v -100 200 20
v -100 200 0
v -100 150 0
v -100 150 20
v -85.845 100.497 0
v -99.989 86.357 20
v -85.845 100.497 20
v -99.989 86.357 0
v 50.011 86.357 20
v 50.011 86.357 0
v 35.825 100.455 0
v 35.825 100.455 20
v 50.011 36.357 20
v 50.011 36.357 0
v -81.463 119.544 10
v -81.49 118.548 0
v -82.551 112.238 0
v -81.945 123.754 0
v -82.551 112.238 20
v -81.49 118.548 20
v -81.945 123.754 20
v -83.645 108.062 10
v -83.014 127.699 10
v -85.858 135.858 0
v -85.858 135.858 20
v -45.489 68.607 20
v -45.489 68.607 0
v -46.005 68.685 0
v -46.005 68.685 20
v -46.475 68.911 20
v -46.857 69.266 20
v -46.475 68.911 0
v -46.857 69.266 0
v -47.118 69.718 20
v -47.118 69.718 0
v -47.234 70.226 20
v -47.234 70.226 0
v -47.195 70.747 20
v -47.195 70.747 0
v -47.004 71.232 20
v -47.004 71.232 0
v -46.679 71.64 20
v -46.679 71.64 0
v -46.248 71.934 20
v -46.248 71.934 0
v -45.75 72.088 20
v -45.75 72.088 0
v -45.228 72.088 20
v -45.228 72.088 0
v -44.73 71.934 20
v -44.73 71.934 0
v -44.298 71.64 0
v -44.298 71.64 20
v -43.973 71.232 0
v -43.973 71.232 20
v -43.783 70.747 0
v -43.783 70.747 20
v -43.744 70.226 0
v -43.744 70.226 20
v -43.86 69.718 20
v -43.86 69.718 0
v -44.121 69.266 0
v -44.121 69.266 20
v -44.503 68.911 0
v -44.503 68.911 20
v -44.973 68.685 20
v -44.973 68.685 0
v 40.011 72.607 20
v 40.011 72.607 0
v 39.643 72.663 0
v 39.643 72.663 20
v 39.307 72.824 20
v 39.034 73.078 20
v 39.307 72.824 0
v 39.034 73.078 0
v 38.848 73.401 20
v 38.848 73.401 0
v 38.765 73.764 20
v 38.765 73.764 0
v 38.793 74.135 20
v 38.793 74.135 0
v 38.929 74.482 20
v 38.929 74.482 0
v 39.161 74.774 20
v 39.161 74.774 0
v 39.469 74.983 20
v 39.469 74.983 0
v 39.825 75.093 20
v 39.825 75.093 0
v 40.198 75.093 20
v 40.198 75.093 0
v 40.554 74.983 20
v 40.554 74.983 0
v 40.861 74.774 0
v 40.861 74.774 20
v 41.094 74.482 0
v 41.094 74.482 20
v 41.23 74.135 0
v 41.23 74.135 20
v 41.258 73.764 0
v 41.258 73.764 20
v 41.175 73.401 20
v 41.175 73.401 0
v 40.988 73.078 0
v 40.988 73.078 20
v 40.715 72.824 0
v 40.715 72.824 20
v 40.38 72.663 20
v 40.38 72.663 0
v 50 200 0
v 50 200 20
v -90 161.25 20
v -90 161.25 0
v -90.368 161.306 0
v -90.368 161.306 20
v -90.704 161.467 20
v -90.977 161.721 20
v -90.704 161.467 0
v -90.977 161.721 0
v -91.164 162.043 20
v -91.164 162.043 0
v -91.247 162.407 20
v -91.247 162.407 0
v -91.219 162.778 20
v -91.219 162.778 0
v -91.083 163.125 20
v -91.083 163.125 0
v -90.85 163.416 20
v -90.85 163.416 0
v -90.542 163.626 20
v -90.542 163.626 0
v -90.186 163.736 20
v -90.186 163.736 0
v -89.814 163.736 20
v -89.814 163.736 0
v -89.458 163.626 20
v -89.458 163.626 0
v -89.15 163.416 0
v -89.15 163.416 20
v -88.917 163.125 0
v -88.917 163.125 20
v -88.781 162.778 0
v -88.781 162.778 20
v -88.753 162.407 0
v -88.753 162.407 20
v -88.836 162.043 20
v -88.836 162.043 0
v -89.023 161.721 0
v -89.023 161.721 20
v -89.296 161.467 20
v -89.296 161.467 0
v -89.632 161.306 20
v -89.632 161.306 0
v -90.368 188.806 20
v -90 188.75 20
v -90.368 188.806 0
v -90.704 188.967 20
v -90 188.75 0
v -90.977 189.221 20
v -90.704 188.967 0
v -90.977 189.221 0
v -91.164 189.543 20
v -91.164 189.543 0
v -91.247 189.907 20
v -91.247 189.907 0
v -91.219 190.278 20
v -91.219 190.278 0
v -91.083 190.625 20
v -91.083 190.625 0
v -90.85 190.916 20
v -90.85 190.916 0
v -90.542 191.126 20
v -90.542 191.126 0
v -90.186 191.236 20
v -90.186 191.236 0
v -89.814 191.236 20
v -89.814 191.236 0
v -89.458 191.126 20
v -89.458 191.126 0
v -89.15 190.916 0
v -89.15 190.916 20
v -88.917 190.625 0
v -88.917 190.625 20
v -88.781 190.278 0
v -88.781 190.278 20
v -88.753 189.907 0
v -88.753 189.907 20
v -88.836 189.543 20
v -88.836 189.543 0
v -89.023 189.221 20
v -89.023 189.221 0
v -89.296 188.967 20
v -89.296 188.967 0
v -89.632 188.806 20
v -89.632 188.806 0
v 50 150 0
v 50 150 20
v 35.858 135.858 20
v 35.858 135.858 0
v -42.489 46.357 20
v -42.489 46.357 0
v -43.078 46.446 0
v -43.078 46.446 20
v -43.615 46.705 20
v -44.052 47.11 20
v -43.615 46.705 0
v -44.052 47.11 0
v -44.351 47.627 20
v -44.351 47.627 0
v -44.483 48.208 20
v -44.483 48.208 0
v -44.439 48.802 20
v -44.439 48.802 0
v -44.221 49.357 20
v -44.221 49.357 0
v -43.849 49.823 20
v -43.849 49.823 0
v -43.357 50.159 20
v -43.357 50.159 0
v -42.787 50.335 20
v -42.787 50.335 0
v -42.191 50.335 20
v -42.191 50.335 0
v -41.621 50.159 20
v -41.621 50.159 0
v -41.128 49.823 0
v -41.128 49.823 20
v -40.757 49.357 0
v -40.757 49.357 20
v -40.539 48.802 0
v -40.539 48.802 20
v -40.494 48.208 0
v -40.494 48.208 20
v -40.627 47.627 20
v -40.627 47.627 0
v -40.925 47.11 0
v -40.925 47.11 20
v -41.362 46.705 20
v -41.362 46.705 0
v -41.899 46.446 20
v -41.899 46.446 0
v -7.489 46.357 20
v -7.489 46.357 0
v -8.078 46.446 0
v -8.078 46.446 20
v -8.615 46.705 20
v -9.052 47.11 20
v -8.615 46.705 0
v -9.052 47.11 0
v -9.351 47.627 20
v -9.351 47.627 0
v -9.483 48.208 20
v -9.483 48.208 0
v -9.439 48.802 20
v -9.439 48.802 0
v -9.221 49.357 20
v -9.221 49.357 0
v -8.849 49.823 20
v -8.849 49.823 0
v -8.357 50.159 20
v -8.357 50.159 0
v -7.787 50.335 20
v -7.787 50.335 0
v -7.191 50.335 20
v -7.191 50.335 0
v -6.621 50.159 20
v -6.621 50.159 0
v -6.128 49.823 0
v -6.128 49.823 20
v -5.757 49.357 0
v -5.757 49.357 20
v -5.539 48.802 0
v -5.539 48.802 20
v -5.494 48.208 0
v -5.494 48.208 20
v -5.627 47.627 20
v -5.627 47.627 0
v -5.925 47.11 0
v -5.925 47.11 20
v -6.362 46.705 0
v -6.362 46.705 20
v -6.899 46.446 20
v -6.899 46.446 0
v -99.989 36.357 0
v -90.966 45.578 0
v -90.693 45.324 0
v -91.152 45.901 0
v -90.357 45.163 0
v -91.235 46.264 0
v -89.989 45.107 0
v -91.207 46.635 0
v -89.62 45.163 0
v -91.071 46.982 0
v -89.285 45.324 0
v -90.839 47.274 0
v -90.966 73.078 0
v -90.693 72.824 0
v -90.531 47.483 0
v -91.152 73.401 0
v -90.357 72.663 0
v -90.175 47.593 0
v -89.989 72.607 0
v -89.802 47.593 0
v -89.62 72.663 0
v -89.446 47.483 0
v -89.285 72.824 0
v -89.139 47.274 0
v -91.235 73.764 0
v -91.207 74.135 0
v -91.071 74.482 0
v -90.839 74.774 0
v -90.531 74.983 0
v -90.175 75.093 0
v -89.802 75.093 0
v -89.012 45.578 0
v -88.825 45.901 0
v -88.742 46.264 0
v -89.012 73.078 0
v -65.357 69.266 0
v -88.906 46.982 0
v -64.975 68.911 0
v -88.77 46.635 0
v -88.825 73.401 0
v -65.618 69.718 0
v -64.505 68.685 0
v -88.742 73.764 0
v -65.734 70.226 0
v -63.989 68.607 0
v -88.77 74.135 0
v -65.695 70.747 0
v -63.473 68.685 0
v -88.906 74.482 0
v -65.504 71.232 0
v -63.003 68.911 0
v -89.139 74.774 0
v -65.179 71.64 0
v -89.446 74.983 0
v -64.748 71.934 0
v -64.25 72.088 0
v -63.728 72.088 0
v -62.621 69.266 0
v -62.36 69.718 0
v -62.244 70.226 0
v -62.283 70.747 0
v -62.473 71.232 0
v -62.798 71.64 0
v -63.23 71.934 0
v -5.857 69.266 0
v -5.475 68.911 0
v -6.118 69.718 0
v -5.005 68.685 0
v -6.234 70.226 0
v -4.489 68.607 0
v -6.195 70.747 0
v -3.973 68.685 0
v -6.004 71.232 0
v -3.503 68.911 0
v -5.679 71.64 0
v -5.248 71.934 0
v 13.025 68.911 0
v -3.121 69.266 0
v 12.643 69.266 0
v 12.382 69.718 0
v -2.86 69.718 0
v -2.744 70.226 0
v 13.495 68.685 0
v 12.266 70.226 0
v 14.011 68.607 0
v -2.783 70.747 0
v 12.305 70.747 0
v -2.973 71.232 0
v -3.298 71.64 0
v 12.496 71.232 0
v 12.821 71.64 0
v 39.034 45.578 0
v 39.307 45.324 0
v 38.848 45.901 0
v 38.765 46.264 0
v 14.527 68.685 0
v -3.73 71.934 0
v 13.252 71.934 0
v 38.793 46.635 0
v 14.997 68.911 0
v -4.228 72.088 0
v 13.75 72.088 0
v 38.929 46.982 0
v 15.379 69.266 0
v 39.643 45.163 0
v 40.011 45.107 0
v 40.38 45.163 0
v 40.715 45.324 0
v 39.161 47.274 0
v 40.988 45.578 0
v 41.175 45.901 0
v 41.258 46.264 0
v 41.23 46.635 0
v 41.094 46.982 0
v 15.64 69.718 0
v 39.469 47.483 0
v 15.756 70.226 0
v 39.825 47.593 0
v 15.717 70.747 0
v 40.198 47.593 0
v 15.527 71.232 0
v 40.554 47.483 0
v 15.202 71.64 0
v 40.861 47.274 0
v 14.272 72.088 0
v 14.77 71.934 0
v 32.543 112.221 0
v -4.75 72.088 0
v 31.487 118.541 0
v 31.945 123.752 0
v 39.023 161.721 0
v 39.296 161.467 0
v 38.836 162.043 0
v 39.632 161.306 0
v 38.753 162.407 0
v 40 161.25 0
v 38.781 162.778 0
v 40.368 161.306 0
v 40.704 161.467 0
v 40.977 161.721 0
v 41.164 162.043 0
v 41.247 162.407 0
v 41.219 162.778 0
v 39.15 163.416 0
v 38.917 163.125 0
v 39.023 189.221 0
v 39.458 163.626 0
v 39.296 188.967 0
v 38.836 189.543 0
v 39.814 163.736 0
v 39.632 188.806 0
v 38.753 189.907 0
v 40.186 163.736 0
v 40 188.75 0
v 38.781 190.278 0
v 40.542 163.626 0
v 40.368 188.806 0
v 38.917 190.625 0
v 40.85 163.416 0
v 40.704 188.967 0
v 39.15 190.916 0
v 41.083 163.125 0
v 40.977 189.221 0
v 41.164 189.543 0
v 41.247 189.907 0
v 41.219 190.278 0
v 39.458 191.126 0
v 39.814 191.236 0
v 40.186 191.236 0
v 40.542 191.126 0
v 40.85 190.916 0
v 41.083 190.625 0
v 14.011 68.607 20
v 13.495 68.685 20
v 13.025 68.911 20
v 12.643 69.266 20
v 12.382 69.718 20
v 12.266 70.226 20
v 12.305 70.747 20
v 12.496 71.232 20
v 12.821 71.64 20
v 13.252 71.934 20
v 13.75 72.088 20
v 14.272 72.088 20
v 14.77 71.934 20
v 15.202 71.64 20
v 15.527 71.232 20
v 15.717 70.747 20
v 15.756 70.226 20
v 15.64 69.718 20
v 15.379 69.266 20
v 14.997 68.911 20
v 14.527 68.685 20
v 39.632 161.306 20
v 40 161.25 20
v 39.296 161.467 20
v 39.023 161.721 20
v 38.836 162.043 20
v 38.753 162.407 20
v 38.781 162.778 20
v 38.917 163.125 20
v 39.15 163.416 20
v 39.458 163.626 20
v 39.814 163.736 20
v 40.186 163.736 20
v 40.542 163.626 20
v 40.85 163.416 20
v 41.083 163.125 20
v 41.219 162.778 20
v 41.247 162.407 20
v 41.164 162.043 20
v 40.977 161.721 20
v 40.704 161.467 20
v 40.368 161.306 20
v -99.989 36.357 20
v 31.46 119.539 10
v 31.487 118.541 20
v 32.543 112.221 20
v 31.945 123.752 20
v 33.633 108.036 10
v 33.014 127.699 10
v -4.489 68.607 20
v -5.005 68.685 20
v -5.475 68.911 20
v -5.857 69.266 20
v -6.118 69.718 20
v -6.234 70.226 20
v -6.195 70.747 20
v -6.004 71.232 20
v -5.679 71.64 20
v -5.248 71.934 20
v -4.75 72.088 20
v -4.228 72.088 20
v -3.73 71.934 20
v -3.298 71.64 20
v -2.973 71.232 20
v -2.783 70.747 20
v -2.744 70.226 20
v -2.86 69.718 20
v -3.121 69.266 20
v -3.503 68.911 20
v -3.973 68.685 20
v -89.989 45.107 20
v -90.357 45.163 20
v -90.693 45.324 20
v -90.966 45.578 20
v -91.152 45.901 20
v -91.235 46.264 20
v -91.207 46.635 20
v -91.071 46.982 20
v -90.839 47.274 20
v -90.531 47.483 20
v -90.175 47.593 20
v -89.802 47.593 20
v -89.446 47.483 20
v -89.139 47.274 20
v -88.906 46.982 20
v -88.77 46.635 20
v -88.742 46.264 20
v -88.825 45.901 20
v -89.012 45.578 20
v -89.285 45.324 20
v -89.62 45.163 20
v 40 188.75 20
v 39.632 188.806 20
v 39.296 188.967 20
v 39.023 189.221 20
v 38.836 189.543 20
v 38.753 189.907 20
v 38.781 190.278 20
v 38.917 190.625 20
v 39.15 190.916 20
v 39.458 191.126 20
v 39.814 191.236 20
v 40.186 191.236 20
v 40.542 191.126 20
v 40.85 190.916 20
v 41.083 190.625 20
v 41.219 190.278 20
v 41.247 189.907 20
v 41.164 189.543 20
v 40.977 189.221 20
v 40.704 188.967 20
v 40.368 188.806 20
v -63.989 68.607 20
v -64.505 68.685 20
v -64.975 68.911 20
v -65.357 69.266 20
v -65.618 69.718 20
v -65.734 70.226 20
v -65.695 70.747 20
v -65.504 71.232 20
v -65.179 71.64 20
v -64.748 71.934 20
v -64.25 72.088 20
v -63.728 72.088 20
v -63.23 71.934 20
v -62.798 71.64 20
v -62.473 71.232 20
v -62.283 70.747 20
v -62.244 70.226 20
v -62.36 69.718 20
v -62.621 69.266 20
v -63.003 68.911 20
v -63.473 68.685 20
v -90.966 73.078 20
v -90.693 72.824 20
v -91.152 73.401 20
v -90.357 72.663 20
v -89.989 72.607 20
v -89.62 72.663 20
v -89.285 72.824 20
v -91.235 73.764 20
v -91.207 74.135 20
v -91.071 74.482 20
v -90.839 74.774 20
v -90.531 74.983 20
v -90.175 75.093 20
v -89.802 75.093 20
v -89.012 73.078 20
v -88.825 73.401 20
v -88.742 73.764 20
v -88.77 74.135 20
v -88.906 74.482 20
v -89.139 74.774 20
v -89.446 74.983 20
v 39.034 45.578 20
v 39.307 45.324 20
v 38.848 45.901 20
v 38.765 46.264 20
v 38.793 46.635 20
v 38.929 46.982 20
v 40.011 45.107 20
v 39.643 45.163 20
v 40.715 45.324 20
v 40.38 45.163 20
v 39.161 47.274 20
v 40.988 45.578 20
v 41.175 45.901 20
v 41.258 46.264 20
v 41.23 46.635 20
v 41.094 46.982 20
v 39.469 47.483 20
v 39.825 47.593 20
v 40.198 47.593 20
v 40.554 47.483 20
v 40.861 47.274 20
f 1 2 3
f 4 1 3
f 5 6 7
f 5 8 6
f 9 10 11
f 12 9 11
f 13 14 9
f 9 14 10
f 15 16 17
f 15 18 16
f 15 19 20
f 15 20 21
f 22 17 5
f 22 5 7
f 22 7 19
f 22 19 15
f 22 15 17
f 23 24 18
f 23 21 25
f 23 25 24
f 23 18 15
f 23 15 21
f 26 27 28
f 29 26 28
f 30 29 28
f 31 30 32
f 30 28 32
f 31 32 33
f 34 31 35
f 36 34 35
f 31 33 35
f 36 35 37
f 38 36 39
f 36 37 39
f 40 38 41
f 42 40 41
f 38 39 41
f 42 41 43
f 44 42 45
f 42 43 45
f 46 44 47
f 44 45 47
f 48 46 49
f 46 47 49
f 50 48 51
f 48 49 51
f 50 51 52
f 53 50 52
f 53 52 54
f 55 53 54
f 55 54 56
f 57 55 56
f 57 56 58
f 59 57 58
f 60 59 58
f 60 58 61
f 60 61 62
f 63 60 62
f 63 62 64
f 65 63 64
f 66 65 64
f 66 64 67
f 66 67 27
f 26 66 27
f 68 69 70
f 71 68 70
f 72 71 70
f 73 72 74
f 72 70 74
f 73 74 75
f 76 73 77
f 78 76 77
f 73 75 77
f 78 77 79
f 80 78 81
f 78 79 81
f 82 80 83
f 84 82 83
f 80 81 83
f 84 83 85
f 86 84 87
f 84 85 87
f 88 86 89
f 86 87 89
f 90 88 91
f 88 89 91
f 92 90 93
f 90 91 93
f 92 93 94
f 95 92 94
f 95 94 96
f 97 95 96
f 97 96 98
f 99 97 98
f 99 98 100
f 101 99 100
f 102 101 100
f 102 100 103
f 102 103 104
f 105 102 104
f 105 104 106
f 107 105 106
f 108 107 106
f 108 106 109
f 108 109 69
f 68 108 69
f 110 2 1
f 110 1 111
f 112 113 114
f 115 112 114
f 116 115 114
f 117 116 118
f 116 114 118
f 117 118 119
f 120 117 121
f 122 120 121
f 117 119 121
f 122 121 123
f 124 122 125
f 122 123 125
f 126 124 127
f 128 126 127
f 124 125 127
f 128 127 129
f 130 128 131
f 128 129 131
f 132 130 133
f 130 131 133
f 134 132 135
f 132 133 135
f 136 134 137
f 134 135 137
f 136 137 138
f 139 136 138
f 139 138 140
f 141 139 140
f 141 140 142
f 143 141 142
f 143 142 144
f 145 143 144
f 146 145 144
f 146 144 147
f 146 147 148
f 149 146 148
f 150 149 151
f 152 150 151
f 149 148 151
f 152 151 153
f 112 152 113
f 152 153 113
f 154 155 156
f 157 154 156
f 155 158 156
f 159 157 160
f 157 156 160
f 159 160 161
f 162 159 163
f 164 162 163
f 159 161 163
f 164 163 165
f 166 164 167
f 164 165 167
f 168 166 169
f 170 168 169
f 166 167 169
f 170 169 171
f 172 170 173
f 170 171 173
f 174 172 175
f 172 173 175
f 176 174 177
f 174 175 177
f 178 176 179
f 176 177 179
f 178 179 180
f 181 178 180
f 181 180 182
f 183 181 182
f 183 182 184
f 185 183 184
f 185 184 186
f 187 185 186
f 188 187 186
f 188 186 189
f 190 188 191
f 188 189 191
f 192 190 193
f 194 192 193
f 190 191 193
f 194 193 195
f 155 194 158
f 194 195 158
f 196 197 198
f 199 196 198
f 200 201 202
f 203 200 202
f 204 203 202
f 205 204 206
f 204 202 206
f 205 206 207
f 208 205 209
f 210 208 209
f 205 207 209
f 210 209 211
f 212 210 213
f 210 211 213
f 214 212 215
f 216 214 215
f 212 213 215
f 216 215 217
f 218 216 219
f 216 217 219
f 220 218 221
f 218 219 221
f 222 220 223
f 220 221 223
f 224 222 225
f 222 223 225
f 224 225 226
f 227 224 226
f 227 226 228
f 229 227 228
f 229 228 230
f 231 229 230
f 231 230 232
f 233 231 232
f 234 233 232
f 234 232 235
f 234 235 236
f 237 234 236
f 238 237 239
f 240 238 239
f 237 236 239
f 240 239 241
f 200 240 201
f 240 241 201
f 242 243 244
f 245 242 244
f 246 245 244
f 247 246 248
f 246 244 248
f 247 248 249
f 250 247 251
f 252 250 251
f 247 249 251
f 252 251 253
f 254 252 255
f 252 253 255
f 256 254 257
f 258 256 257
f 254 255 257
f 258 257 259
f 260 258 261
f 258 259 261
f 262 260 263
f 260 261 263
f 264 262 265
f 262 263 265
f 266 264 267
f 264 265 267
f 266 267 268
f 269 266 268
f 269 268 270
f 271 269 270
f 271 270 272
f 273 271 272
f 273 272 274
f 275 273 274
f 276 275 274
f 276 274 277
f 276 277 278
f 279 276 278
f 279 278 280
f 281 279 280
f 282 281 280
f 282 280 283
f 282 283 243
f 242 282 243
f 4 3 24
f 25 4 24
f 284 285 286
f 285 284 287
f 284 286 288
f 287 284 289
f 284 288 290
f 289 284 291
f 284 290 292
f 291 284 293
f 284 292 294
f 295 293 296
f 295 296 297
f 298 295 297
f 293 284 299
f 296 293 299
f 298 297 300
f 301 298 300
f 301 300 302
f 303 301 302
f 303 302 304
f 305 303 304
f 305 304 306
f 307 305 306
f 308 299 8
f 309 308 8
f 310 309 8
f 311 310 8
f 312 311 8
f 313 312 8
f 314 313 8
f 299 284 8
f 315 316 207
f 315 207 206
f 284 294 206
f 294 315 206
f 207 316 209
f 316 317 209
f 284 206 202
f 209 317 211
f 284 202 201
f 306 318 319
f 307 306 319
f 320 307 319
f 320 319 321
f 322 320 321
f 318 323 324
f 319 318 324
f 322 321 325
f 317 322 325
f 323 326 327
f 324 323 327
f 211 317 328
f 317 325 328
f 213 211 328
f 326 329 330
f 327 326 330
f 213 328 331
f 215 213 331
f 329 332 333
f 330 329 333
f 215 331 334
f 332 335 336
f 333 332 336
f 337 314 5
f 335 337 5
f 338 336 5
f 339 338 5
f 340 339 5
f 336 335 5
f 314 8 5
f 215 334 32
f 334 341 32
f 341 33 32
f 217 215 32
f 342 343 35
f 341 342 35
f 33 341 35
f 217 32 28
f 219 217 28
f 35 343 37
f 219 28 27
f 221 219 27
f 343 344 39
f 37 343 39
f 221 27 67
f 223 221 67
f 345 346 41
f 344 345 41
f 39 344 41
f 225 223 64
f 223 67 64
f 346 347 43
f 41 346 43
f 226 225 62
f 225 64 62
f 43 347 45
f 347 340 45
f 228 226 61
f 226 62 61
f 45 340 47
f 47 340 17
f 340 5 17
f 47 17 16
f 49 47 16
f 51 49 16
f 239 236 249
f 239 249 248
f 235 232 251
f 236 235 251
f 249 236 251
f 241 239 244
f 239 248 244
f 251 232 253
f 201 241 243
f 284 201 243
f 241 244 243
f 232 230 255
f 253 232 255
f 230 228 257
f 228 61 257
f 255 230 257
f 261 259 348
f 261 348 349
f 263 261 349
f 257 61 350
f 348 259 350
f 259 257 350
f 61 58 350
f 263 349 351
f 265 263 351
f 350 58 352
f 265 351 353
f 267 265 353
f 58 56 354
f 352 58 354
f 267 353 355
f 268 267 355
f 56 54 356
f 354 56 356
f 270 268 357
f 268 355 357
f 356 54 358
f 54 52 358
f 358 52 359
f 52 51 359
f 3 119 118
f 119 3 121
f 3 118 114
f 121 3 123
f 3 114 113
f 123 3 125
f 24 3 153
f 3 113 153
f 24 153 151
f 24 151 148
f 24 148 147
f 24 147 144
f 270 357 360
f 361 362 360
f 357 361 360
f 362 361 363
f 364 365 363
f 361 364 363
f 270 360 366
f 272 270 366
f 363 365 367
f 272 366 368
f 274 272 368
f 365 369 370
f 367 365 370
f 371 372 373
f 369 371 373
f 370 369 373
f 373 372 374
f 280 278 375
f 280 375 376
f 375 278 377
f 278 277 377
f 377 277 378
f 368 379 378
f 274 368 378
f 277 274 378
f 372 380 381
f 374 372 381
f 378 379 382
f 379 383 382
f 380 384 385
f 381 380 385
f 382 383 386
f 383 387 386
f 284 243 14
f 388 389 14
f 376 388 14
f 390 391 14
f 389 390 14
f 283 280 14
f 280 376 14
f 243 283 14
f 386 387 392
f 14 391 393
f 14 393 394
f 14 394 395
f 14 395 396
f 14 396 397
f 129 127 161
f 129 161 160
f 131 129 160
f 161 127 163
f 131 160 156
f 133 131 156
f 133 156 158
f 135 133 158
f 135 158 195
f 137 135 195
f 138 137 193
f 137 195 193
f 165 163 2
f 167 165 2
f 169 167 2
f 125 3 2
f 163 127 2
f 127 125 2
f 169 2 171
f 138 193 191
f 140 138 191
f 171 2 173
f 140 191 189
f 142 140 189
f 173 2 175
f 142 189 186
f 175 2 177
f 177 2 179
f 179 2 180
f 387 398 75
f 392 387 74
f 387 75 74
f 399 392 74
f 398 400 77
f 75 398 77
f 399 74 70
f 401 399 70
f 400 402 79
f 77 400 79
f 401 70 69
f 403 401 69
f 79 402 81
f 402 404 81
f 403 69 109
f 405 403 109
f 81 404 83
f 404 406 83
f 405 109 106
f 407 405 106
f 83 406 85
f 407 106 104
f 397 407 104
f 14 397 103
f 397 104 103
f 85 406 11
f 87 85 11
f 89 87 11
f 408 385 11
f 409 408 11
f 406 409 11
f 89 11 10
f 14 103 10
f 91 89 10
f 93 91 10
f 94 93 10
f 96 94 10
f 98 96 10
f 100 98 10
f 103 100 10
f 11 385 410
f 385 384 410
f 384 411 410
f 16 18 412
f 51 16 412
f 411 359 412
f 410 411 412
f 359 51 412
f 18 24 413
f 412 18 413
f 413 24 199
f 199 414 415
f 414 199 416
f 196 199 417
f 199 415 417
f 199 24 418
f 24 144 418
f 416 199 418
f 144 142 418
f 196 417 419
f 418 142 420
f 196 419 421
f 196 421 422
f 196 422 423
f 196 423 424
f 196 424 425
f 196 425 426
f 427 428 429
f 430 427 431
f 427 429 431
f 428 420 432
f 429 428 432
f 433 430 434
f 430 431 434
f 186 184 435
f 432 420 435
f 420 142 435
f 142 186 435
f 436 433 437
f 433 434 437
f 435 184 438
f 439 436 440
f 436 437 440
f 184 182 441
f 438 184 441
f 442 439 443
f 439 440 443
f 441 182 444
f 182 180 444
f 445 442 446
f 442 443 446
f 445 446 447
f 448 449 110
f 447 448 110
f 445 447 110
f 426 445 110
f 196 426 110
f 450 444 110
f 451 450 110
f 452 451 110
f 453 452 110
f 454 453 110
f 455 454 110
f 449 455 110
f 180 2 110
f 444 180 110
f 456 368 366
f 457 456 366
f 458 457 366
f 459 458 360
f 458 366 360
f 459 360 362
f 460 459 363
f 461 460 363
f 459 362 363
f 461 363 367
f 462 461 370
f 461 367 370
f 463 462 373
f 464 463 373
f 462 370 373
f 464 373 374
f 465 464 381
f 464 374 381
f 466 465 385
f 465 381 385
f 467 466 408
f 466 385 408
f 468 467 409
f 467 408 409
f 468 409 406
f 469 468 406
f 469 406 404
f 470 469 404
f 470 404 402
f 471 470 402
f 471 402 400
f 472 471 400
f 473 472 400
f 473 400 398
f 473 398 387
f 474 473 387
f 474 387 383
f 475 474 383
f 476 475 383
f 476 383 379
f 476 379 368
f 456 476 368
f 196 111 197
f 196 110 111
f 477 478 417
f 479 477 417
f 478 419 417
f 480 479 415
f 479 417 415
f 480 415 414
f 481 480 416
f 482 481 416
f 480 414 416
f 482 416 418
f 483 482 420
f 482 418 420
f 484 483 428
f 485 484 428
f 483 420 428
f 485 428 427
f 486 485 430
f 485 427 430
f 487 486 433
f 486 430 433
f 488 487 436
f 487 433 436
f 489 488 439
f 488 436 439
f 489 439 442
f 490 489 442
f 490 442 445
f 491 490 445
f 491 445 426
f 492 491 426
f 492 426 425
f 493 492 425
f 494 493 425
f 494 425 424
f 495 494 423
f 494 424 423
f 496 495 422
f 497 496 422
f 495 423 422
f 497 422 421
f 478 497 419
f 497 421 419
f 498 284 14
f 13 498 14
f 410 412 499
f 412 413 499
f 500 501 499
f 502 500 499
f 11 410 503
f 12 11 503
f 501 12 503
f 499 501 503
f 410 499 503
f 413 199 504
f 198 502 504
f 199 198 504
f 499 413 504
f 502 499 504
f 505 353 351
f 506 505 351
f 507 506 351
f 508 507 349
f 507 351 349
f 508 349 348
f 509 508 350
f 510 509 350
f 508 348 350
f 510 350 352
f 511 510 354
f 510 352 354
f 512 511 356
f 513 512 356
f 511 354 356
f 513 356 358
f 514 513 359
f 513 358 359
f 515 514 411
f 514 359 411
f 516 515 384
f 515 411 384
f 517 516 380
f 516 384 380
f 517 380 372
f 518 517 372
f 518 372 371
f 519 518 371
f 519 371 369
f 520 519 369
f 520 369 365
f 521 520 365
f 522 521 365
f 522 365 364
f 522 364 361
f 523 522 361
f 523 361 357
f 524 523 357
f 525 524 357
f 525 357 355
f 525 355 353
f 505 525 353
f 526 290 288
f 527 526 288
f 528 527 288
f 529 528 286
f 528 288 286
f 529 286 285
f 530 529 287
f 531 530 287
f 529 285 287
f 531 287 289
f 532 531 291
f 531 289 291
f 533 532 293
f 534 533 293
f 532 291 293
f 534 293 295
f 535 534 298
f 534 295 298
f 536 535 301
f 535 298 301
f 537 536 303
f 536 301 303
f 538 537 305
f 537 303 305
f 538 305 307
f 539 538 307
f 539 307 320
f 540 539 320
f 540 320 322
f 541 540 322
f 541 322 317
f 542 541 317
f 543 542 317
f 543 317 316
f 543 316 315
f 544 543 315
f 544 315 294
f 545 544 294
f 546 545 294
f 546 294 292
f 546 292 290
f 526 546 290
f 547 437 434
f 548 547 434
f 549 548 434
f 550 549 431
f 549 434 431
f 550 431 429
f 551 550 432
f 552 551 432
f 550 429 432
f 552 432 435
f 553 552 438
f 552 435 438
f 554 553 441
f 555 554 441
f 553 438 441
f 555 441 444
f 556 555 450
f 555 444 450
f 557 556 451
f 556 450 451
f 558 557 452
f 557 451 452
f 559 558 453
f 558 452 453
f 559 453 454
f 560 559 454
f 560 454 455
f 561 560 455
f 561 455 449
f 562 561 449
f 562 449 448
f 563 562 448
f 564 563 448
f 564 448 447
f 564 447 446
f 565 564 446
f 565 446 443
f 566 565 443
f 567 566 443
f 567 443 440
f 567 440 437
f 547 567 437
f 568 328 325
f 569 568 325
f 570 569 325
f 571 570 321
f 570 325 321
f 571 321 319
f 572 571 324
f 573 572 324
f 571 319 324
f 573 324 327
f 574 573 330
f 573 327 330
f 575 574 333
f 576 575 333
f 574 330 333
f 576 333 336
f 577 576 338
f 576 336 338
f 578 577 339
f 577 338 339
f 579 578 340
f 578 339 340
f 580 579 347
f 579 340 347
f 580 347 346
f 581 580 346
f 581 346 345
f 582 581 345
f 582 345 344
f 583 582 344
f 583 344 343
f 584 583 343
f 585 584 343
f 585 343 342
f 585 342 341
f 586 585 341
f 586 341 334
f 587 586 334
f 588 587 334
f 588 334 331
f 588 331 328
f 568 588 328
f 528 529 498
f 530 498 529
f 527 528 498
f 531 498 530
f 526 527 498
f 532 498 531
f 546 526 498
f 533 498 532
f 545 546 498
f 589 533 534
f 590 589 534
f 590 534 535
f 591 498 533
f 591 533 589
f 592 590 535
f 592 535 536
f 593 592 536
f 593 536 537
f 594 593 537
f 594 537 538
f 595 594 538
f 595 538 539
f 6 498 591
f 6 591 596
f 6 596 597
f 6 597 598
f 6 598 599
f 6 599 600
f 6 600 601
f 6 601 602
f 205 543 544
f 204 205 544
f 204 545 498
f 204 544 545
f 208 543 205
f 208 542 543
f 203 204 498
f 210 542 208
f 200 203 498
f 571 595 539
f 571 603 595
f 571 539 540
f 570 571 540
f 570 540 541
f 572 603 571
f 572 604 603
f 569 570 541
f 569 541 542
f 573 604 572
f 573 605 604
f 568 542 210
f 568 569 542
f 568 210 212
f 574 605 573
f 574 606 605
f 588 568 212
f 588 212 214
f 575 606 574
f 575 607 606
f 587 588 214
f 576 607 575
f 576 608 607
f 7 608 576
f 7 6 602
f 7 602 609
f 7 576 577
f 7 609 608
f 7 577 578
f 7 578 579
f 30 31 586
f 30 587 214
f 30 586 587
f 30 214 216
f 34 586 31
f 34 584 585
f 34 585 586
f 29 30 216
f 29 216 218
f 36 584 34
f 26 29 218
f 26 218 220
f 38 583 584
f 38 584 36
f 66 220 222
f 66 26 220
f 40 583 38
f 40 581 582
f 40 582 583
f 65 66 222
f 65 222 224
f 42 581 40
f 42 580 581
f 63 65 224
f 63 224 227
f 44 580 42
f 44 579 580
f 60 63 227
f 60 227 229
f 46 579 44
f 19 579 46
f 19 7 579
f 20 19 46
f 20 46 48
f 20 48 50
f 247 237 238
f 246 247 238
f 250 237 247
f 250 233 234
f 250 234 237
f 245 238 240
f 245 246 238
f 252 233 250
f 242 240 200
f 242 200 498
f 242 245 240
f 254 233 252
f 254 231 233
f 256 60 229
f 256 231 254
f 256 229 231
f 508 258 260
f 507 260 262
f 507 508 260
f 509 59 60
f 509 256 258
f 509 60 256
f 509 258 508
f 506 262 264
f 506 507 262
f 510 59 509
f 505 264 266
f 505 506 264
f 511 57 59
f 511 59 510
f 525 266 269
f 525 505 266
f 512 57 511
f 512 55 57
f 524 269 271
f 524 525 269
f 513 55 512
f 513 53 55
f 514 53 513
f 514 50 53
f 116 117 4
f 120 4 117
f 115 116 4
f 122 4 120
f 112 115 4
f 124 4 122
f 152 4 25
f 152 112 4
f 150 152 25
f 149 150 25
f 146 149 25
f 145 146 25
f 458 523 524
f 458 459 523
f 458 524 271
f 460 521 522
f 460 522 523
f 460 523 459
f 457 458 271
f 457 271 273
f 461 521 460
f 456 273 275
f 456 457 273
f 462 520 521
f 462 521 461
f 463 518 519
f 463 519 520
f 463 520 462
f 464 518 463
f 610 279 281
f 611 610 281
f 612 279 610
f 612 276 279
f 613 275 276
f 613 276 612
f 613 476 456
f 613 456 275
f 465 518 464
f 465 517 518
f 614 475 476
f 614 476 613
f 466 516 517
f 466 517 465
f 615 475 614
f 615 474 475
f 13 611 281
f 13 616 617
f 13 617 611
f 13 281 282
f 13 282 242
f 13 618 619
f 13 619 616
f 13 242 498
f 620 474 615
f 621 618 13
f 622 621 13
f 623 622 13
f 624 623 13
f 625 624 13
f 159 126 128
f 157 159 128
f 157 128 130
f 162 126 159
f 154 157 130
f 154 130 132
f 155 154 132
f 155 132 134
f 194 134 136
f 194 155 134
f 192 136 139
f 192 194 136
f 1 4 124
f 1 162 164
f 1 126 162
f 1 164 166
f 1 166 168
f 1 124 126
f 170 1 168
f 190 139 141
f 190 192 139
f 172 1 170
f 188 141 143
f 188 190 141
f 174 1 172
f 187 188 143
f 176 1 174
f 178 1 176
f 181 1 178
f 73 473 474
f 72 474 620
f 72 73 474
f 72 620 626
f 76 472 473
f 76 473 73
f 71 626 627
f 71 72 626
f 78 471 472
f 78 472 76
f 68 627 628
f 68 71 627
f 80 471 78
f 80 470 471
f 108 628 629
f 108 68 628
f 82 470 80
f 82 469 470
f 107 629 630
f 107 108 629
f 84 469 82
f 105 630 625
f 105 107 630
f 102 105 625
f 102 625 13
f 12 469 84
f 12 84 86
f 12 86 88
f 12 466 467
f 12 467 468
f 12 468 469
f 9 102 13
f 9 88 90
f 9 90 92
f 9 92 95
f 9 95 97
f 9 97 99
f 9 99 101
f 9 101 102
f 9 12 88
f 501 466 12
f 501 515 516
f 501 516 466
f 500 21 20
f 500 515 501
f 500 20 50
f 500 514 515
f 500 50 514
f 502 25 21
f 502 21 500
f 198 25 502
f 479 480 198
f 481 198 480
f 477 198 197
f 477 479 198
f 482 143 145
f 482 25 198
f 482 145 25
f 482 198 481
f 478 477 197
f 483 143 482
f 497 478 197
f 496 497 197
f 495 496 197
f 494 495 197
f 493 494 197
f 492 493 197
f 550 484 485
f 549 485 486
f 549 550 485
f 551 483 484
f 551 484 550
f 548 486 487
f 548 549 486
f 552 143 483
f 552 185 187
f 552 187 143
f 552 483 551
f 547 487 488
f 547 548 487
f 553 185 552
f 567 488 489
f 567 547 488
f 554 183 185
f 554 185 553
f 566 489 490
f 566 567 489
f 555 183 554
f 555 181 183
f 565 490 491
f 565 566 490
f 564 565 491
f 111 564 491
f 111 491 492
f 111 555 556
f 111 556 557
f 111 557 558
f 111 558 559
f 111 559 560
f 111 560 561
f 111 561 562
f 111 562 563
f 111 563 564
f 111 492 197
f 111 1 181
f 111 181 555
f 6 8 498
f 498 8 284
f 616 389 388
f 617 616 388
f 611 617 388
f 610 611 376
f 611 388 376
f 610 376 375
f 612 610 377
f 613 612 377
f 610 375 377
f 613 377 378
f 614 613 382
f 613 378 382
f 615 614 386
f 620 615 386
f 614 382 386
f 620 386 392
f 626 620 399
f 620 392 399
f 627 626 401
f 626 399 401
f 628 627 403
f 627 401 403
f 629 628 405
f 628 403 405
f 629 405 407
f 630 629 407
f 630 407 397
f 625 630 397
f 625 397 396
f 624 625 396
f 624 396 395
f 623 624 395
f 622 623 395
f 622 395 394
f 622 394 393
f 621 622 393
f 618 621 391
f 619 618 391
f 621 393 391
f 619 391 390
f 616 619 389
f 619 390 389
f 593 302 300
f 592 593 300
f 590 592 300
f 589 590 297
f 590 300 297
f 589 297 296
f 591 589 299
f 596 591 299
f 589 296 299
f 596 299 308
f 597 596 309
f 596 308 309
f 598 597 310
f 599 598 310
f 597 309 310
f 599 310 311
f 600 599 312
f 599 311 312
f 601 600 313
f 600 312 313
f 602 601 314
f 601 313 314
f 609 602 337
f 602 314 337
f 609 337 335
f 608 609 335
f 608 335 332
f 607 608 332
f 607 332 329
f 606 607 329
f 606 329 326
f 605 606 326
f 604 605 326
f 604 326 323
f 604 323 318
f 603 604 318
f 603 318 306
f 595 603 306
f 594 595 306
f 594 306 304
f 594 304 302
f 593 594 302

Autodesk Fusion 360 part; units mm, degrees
sketch "Esboço1" plane through (0, 0, 0) normal (0, 0, 1) x (1, 0, 0)
  line L0 (-100, 200) -> (-100, 150)
  line L1 (-99.9888, 86.3572) -> (-99.9888, 36.3572)
  line L2 (-99.9888, 36.3572) -> (50.0112, 36.3572)
  line L3 (-100, 200) -> (50, 200)
  line L4 (50, 200) -> (50, 150)
  line L5 (50.0112, 36.3572) -> (50.0112, 86.3572)
  line L6 (-99.9888, 86.3572) -> (-85.8446, 100.4973)
  line L7 (50.0112, 86.3572) -> (35.8252, 100.4553)
  line L8 (50, 150) -> (35.8579, 135.8579)
  line L9 (-100, 150) -> (-85.8579, 135.8579)
  spline S0 degree 2 poles (-85.8446, 100.4973) (-80, 120) (-85.8579, 135.8579) knots 0 0 0 3.643978 3.643978 3.643978 weights 1 3 1
  spline S1 degree 2 poles (35.8252, 100.4553) (30, 120) (35.8579, 135.8579) knots 0 0 0 3.647748 3.647748 3.647748 weights 1 3 1
  dimension "d1" = 50
  dimension "d5" = 50
  dimension "d6" = 150
  dimension "d7" = 150
  dimension "d8" = 50
  dimension "d9" = 50
  dimension "d13" = 20
  dimension "d14" = 20
  dimension "d15" = 20
  dimension "d16" = 20
extrude "Extrusão1" add sketch "Esboço1" along normal blind 20
hole "Furo1" at (40, 190, 20) direction (0, 0, -1) diameter 2.5 depth 30 tip angle 118
hole "Furo2" at (40, 162.5, 20) direction (0, 0, -1) diameter 2.5 depth 30 tip angle 118
hole "Furo3" at (-90, 190, 20) direction (0, 0, -1) diameter 2.5 depth 30 tip angle 118
hole "Furo4" at (-90, 162.5, 20) direction (0, 0, -1) diameter 2.5 depth 30 tip angle 118
hole "Furo5" at (-89.9888, 73.8572, 20) direction (0, 0, -1) diameter 2.5 depth 30 tip angle 118
hole "Furo6" at (-89.9888, 46.3572, 20) direction (0, 0, -1) diameter 2.5 depth 30 tip angle 118
hole "Furo7" at (40.0112, 73.8572, 20) direction (0, 0, -1) diameter 2.5 depth 30 tip angle 118
hole "Furo8" at (40.0112, 46.3572, 20) direction (0, 0, -1) diameter 2.5 depth 30 tip angle 118
hole "Furo9" at (-42.4888, 48.3572, 20) direction (0, 0, -1) diameter 4 depth 30 tip angle 118
hole "Furo10" at (-7.4888, 48.3572, 20) direction (0, 0, -1) diameter 4 depth 30 tip angle 118
hole "Furo11" at (14.0112, 70.3572, 20) direction (0, 0, -1) diameter 3.5 depth 30 tip angle 118
hole "Furo12" at (-4.4888, 70.3572, 20) direction (0, 0, -1) diameter 3.5 depth 30 tip angle 118
hole "Furo13" at (-45.4888, 70.3572, 20) direction (0, 0, -1) diameter 3.5 depth 30 tip angle 118
hole "Furo14" at (-63.9888, 70.3572, 20) direction (0, 0, -1) diameter 3.5 depth 30 tip angle 118
